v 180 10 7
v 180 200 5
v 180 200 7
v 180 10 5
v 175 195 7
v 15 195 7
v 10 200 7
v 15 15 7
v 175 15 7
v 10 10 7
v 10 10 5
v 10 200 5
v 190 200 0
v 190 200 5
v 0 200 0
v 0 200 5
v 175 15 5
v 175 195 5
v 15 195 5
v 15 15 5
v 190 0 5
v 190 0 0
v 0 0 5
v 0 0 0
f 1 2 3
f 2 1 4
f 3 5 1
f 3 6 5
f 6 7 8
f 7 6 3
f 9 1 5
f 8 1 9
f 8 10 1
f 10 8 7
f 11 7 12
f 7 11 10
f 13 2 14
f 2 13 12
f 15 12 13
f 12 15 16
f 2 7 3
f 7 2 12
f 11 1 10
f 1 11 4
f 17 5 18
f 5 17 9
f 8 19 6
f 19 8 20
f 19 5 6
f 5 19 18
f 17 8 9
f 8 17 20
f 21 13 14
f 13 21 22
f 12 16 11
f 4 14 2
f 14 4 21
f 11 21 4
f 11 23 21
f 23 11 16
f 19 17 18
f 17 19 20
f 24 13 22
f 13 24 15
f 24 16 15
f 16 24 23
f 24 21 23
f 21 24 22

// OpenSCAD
//Customisable Box mobile projector from Saurabh Karanke
//Enter mobile dimensions 
//Enter mobile length
length=150;
//Enter mobile width
width=73.5;
//Enter mobile thickness
thickness=9.5;
daimeter=72;//[50:72]
l=length+20;l1=length-2;l2=length+2;
w=width+20;w1=width+9;w2=width+11;
t=20;//[20:20]
tl=thickness+2;
t1=18-tl;
 module cover(){
     union(){
cube([l+20,200,5]);
     translate([l/2+10,105,5])
     difference(){
cube([l,190,4],center=true);
         cube([l-10,180,4],center=true);
     }
 }   
 }
 cover();
